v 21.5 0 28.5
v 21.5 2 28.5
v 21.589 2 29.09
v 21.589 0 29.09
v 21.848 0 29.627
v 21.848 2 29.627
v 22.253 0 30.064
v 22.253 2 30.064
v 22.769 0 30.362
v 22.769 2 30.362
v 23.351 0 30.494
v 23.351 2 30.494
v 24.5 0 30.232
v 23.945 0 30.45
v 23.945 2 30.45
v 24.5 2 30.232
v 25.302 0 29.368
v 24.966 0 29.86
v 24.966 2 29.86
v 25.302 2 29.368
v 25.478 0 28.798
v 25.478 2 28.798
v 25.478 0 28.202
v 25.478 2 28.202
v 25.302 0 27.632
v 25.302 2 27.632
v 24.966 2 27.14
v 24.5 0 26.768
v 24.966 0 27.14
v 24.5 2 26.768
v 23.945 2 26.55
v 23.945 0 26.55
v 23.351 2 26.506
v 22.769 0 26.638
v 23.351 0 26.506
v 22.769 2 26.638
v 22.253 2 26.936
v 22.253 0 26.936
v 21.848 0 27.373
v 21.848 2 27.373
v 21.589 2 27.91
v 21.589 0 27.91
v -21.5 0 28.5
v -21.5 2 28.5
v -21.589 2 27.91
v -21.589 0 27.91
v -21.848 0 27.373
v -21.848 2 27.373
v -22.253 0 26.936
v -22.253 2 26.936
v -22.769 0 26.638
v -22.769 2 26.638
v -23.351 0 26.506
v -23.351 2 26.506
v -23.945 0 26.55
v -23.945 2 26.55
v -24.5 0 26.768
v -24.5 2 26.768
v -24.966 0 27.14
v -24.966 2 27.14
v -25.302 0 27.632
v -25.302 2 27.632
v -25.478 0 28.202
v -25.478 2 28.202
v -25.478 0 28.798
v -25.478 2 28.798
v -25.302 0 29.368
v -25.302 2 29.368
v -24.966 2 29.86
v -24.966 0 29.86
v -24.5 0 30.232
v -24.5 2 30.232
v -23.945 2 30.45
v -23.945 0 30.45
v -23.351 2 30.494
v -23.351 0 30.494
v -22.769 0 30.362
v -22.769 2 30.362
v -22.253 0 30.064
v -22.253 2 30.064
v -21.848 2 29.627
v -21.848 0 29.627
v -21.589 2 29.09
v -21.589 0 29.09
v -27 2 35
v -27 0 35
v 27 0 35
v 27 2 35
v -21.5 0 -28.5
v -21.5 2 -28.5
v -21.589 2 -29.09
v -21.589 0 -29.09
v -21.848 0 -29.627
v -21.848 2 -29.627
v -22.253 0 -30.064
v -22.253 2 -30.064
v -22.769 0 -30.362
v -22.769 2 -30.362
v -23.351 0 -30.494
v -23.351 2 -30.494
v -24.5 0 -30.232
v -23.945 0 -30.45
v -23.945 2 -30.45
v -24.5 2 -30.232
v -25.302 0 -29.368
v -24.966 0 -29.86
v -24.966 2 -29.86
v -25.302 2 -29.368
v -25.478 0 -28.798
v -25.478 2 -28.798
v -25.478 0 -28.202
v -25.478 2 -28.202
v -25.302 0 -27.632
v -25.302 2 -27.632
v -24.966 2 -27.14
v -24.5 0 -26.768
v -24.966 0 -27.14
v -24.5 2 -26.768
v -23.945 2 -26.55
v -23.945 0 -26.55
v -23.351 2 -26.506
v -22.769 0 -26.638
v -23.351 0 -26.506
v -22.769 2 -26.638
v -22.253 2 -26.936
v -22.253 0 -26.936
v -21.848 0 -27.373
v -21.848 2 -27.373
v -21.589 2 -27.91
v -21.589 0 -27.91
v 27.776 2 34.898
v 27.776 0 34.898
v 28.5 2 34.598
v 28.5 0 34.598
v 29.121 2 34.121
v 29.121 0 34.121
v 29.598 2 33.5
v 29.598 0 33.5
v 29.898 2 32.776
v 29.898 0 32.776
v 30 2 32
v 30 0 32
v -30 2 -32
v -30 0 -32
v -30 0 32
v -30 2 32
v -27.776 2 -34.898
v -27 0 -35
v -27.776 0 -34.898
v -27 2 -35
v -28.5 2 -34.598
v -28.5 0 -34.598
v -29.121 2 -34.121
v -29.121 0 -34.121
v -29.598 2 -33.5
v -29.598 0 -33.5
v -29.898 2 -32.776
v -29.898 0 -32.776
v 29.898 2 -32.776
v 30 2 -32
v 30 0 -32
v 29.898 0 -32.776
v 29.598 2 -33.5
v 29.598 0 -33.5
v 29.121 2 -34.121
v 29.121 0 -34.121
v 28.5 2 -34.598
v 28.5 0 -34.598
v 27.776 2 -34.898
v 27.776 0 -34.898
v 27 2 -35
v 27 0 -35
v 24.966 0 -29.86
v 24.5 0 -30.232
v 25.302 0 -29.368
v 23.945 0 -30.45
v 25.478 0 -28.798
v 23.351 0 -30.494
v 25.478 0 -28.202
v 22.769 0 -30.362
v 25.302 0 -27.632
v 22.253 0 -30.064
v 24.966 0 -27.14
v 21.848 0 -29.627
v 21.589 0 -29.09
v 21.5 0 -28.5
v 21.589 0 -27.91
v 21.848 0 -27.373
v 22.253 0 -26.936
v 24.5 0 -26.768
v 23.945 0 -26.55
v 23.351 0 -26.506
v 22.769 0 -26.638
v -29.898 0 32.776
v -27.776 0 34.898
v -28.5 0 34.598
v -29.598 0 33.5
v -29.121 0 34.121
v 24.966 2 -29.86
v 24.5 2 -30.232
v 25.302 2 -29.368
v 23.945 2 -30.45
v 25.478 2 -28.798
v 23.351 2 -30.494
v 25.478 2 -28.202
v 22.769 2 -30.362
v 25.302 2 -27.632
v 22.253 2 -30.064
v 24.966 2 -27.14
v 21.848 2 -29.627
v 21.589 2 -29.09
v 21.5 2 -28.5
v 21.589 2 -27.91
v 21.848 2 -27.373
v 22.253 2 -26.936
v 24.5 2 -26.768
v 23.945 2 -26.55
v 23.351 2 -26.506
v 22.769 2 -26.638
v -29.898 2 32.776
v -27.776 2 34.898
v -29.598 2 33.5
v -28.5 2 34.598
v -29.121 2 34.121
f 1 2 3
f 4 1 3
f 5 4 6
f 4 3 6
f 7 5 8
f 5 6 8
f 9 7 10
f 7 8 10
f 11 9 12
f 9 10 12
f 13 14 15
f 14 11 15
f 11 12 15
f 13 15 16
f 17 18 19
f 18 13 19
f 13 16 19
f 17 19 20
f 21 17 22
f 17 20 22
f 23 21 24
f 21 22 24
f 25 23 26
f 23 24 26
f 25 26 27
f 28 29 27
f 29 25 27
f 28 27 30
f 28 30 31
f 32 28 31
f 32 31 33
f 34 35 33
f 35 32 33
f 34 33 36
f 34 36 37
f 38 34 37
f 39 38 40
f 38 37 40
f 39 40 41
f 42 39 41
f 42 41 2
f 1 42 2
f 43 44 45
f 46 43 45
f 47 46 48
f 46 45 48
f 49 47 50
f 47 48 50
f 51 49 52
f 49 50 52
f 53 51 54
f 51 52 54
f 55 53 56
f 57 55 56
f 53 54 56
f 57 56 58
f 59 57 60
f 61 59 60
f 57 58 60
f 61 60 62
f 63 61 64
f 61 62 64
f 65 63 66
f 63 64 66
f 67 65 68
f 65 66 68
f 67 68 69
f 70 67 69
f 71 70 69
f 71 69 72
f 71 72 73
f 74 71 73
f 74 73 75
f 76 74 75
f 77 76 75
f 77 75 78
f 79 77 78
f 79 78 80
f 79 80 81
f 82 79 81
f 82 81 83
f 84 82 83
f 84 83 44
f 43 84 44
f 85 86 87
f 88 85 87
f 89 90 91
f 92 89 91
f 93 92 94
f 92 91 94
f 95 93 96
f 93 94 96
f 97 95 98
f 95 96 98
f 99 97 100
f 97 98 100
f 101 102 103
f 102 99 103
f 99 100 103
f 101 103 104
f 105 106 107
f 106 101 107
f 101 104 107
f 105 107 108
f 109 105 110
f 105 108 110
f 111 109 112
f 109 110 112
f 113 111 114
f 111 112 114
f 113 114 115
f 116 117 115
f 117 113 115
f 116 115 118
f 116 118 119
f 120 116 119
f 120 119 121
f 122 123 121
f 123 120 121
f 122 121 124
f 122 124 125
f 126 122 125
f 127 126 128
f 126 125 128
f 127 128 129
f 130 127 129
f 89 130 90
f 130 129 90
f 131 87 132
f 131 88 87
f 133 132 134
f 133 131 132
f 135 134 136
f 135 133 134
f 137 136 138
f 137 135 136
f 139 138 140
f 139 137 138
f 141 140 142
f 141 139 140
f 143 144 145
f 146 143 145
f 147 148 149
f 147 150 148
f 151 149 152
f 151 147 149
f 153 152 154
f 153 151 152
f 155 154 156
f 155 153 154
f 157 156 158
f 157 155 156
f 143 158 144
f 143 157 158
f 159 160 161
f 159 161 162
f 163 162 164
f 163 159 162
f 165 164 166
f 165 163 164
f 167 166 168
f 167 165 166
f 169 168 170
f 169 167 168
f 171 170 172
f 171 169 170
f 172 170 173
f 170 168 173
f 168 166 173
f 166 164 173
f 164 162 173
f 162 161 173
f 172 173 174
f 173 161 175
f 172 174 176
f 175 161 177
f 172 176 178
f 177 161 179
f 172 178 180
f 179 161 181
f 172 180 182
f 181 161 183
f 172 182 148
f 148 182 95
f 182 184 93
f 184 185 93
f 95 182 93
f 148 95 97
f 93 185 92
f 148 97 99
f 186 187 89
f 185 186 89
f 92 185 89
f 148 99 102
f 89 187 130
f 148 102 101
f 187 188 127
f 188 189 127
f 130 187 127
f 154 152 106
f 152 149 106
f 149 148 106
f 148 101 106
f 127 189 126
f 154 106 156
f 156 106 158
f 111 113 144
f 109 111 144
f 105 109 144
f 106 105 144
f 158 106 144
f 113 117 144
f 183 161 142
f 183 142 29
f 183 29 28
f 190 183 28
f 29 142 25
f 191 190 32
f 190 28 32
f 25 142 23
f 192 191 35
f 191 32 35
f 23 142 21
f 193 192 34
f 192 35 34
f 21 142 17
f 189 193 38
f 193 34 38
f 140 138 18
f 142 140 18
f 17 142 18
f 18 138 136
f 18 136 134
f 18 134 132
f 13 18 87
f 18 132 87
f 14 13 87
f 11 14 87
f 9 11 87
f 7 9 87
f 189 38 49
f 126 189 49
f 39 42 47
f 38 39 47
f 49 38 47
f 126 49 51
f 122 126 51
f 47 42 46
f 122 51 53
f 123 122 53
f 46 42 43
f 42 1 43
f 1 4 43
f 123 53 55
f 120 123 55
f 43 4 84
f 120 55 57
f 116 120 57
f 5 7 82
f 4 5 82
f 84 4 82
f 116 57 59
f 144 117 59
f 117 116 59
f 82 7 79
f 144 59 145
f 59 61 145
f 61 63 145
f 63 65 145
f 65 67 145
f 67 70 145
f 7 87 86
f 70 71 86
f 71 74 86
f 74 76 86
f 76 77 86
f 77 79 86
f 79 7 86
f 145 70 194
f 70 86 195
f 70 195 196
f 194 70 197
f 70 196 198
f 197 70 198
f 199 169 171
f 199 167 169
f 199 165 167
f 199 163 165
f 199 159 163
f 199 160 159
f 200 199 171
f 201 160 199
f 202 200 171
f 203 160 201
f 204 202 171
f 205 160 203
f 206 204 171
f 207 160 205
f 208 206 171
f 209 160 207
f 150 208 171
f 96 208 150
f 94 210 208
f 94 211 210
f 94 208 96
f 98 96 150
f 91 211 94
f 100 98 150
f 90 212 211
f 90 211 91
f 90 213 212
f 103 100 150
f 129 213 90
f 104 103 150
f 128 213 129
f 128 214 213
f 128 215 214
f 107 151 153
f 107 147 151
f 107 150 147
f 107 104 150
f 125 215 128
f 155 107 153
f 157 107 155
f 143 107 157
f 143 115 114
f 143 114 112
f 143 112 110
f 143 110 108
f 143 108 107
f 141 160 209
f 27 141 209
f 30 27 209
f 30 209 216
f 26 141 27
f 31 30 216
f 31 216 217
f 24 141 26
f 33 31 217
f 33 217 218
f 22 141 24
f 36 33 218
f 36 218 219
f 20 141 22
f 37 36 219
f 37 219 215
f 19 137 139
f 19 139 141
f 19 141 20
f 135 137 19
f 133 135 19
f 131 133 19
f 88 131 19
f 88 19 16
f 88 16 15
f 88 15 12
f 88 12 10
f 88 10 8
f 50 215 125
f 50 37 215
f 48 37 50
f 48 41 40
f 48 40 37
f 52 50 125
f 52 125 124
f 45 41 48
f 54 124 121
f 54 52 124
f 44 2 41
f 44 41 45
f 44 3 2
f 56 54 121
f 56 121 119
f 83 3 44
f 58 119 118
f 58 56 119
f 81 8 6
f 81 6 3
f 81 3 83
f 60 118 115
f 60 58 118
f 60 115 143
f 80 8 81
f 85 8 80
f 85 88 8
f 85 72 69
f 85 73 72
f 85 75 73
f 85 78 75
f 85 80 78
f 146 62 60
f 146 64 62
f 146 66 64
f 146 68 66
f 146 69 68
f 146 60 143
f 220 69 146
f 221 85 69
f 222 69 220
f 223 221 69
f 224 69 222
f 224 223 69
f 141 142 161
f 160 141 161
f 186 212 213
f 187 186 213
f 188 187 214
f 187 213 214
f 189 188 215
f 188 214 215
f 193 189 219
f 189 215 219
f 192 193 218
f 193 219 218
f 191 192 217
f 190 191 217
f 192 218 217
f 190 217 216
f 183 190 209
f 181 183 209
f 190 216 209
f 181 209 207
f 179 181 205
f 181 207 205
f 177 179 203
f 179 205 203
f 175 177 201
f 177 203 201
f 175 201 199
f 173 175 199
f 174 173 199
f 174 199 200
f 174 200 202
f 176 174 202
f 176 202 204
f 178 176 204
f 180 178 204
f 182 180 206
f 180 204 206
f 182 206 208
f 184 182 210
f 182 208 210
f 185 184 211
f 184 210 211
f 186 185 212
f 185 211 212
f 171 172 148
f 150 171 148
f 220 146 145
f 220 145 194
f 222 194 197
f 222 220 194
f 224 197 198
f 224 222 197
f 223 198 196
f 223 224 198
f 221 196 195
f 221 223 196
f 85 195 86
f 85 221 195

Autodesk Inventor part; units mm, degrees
ref_plane "YZ Plane" through (0, 0, 0) normal (1, 0, 0) x (0, 1, 0)
ref_plane "XZ Plane" through (0, 0, 0) normal (0, 1, 0) x (-1, 0, 0)
ref_plane "XY Plane" through (0, 0, 0) normal (0, 0, 1) x (1, 0, 0)
sketch "Sketch1" plane through (0, 0, 0) normal (0, 1, 0) x (-1, 0, 0)
  line L0 (30, 35) -> (-30, 35)
  line L1 (-30, 35) -> (-30, -35)
  line L2 (-30, -35) -> (30, -35)
  line L3 (30, -35) -> (30, 35)
  line L4 (30, 35) -> (-30, -35) construction
  line L5 (-30, 35) -> (30, -35) construction
  point P0 (0, 0)
  dimension "d0" = 60
  dimension "d1" = 70
extrude "Extrusion1" add sketch "Sketch1" along normal blind 2
sketch "Sketch2" plane through (0, 2, 0) normal (0, 1, 0) x (1, 0, 0)
  circle A0 centre (-23.5, -28.5) radius 2
  line L0 (-30, 35) -> (-30, -35) projected
  line L1 (-30, -35) -> (30, -35) projected
  point P0 (0, 0)
  dimension "d4" = 4
  dimension "d5" = 6.5
  dimension "d6" = 6.5
extrude "Extrusion2" cut sketch "Sketch2" against normal blind 2
mirror "Mirror1" about plane through (0, 0, 0) normal (0, 0, 1) of "Extrusion2"
mirror "Mirror2" about plane through (0, 0, 0) normal (1, 0, 0) of "Extrusion2", "Mirror1"
fillet "Fillet1" radius 3 4 edges at (-30, 1, 35) (-30, 1, -35) (30, 1, -35) (30, 1, 35)
properties part number "Kraicka_senzory_vrchnak"
